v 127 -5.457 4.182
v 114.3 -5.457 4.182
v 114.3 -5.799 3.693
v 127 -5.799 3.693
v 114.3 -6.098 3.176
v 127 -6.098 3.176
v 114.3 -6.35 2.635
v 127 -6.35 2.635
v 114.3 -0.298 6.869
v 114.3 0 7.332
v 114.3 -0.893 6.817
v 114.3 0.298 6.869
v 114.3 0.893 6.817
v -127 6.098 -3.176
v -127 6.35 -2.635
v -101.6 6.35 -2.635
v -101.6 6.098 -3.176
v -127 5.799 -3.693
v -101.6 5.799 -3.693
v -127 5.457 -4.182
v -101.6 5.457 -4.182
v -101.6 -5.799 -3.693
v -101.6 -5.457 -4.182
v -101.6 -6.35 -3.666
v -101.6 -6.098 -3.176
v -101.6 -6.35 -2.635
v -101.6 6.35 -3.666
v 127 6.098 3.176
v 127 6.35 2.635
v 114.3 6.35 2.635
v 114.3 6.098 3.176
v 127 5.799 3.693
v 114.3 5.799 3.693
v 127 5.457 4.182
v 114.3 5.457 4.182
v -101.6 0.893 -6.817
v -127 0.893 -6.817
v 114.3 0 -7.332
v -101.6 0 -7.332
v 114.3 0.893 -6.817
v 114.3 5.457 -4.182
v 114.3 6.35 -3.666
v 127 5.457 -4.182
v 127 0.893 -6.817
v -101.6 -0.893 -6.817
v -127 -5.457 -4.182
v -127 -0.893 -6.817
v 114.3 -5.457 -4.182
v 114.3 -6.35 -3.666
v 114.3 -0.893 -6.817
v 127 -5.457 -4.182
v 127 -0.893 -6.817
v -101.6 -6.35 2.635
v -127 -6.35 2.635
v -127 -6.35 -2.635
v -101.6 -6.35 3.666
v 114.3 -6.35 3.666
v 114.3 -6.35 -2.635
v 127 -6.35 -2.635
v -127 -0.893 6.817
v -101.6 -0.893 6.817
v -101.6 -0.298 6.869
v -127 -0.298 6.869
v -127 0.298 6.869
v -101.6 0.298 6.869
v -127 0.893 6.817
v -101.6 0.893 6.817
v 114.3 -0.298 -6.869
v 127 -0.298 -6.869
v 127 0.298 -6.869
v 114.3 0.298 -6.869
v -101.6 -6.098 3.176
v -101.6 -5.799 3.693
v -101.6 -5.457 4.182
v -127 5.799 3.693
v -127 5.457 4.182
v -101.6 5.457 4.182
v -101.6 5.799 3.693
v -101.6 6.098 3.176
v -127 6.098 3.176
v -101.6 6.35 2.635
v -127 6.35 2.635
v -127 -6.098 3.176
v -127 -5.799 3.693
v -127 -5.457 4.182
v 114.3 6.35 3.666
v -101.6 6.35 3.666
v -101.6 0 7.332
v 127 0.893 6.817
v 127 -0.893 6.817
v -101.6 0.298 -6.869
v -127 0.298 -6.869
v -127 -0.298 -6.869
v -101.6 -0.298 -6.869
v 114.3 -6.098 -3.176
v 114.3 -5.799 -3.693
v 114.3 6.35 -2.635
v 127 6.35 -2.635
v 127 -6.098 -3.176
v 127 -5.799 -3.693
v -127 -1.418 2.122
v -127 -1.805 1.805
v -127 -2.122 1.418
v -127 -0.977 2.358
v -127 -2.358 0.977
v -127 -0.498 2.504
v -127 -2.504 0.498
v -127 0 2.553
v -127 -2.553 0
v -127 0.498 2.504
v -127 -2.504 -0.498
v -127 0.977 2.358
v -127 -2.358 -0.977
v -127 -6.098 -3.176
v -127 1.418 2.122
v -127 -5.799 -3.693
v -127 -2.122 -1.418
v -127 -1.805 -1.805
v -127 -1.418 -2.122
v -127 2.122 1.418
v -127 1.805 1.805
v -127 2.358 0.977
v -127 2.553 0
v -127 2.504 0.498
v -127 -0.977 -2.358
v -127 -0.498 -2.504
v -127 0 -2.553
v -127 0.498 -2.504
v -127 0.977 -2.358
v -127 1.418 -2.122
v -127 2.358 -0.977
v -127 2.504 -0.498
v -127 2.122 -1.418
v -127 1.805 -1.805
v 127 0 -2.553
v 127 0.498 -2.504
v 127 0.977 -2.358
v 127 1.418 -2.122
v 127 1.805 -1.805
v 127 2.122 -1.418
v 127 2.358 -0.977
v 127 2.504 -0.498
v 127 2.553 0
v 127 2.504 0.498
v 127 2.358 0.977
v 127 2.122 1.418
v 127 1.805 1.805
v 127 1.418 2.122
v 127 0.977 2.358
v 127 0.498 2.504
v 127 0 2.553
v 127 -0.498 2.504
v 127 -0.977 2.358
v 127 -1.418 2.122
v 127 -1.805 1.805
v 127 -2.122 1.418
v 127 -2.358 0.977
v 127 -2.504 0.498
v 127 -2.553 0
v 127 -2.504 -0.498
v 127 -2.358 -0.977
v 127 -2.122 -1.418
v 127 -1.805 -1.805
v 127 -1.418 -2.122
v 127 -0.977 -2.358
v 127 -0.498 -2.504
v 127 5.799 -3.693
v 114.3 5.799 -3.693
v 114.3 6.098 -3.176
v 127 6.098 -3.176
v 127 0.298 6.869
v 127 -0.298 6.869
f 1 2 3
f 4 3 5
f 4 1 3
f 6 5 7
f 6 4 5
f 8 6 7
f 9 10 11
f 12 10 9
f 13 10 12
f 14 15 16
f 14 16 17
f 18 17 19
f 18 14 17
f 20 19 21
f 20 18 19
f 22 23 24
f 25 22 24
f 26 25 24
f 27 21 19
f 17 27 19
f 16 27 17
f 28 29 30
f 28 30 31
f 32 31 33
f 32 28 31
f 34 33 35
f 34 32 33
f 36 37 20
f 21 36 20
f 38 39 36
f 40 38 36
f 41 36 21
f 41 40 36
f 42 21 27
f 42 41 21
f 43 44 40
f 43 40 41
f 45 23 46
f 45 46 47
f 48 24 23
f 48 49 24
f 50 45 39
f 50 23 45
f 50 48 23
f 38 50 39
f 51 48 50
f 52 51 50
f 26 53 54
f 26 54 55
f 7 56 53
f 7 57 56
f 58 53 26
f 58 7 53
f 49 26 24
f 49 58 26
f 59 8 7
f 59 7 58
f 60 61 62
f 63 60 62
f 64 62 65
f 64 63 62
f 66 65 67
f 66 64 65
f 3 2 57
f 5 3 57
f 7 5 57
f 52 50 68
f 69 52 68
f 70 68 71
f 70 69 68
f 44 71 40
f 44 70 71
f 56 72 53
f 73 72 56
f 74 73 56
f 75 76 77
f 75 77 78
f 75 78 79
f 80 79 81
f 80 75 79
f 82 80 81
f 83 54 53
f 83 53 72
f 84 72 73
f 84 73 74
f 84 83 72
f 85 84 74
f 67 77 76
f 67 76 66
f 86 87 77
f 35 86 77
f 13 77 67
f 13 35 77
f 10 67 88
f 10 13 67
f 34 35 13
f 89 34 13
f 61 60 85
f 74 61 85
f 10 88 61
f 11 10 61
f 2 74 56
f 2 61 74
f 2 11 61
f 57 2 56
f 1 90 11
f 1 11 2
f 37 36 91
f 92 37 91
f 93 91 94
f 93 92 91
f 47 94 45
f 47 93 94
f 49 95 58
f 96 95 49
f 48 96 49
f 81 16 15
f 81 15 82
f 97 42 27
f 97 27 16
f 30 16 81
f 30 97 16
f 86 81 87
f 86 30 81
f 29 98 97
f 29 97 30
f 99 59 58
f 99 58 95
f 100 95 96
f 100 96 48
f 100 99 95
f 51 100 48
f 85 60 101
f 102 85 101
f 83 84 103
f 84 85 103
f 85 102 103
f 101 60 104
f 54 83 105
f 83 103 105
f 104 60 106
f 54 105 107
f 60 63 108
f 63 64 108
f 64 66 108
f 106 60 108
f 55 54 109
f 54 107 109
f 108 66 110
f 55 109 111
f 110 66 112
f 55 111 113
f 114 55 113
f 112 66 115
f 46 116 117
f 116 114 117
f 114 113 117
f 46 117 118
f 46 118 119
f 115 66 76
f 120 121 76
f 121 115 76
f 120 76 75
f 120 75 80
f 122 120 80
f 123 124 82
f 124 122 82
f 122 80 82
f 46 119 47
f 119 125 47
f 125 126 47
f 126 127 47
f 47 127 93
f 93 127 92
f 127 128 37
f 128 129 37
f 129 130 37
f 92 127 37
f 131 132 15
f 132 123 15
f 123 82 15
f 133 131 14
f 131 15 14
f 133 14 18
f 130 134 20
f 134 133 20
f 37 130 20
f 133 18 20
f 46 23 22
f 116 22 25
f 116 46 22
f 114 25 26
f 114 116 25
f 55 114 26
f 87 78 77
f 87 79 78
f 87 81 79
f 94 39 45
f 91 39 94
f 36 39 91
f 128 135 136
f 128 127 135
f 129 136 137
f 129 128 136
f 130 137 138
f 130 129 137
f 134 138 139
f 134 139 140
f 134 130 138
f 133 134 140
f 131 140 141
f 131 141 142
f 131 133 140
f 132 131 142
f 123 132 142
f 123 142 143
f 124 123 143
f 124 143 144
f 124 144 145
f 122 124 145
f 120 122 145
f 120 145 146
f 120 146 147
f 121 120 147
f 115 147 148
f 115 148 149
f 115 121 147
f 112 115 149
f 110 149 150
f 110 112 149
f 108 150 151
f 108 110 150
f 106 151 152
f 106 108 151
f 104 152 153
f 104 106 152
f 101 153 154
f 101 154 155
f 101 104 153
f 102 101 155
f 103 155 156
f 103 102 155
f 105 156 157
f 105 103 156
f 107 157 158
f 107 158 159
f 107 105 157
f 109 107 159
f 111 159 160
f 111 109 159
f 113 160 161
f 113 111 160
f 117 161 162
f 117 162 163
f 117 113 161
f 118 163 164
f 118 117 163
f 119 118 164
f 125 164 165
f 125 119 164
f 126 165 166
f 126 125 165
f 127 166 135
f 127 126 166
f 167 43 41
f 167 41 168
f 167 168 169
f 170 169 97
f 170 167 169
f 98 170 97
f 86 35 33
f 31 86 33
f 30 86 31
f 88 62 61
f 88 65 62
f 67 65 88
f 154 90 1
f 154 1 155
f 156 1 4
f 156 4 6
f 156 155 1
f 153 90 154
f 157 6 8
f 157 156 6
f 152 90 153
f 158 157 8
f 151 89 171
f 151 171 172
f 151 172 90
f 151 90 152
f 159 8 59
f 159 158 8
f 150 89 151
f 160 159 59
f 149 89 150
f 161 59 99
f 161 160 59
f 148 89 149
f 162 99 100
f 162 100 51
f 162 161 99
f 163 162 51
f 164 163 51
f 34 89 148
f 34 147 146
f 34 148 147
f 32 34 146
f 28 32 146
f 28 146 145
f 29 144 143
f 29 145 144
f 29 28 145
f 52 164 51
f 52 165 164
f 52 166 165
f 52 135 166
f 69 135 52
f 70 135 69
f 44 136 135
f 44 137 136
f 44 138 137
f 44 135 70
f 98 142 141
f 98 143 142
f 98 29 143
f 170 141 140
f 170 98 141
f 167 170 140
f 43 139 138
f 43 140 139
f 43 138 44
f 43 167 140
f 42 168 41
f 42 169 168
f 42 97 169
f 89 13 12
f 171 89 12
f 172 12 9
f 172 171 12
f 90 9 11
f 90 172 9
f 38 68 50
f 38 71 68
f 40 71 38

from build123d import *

# Parameters (mm, degrees)
SKETCH1_R           = 2.5527
BOSS_EXTRUDE1_DEPTH = 127
SKETCH2_OUTSIDE_W   = 67.612
SKETCH2_OUTSIDE_H   = 65.648
SKETCH2_OUTSIDE_R   = 6.875
CUT_EXTRUDE1_DEPTH  = 25.4
SKETCH3_OUTSIDE_W   = 67.612
SKETCH3_OUTSIDE_H   = 65.648
SKETCH3_OUTSIDE_R   = 6.875
CUT_EXTRUDE2_DEPTH  = 12.7


with BuildPart() as part:
    # Sketch1 → Boss-Extrude1 (new, symmetric)
    with BuildSketch(Plane(origin=(0, 0, 0), x_dir=(0, 0, -1), z_dir=(1, 0, 0))):
        Polygon((3.666174209, -6.35), (7.332348419, 0), (3.666174209, 6.35), (-3.666174209, 6.35), (-7.332348419, 0), (-3.666174209, -6.35), align=None)
        Circle(SKETCH1_R, mode=Mode.SUBTRACT)
    extrude(amount=BOSS_EXTRUDE1_DEPTH, both=True)

    # Sketch2 outside → Cut-Extrude1 (cut)
    with BuildSketch(Plane.ZY.offset(127)):
        Rectangle(SKETCH2_OUTSIDE_W, SKETCH2_OUTSIDE_H)
        Circle(SKETCH2_OUTSIDE_R, mode=Mode.SUBTRACT)
    extrude(amount=-CUT_EXTRUDE1_DEPTH, mode=Mode.SUBTRACT)

    # Sketch3 outside → Cut-Extrude2 (cut)
    with BuildSketch(Plane(origin=(127, 0, 0), x_dir=(0, 0, -1), z_dir=(1, 0, 0))):
        Rectangle(SKETCH3_OUTSIDE_W, SKETCH3_OUTSIDE_H)
        Circle(SKETCH3_OUTSIDE_R, mode=Mode.SUBTRACT)
    extrude(amount=-CUT_EXTRUDE2_DEPTH, mode=Mode.SUBTRACT)


solid = part.part
